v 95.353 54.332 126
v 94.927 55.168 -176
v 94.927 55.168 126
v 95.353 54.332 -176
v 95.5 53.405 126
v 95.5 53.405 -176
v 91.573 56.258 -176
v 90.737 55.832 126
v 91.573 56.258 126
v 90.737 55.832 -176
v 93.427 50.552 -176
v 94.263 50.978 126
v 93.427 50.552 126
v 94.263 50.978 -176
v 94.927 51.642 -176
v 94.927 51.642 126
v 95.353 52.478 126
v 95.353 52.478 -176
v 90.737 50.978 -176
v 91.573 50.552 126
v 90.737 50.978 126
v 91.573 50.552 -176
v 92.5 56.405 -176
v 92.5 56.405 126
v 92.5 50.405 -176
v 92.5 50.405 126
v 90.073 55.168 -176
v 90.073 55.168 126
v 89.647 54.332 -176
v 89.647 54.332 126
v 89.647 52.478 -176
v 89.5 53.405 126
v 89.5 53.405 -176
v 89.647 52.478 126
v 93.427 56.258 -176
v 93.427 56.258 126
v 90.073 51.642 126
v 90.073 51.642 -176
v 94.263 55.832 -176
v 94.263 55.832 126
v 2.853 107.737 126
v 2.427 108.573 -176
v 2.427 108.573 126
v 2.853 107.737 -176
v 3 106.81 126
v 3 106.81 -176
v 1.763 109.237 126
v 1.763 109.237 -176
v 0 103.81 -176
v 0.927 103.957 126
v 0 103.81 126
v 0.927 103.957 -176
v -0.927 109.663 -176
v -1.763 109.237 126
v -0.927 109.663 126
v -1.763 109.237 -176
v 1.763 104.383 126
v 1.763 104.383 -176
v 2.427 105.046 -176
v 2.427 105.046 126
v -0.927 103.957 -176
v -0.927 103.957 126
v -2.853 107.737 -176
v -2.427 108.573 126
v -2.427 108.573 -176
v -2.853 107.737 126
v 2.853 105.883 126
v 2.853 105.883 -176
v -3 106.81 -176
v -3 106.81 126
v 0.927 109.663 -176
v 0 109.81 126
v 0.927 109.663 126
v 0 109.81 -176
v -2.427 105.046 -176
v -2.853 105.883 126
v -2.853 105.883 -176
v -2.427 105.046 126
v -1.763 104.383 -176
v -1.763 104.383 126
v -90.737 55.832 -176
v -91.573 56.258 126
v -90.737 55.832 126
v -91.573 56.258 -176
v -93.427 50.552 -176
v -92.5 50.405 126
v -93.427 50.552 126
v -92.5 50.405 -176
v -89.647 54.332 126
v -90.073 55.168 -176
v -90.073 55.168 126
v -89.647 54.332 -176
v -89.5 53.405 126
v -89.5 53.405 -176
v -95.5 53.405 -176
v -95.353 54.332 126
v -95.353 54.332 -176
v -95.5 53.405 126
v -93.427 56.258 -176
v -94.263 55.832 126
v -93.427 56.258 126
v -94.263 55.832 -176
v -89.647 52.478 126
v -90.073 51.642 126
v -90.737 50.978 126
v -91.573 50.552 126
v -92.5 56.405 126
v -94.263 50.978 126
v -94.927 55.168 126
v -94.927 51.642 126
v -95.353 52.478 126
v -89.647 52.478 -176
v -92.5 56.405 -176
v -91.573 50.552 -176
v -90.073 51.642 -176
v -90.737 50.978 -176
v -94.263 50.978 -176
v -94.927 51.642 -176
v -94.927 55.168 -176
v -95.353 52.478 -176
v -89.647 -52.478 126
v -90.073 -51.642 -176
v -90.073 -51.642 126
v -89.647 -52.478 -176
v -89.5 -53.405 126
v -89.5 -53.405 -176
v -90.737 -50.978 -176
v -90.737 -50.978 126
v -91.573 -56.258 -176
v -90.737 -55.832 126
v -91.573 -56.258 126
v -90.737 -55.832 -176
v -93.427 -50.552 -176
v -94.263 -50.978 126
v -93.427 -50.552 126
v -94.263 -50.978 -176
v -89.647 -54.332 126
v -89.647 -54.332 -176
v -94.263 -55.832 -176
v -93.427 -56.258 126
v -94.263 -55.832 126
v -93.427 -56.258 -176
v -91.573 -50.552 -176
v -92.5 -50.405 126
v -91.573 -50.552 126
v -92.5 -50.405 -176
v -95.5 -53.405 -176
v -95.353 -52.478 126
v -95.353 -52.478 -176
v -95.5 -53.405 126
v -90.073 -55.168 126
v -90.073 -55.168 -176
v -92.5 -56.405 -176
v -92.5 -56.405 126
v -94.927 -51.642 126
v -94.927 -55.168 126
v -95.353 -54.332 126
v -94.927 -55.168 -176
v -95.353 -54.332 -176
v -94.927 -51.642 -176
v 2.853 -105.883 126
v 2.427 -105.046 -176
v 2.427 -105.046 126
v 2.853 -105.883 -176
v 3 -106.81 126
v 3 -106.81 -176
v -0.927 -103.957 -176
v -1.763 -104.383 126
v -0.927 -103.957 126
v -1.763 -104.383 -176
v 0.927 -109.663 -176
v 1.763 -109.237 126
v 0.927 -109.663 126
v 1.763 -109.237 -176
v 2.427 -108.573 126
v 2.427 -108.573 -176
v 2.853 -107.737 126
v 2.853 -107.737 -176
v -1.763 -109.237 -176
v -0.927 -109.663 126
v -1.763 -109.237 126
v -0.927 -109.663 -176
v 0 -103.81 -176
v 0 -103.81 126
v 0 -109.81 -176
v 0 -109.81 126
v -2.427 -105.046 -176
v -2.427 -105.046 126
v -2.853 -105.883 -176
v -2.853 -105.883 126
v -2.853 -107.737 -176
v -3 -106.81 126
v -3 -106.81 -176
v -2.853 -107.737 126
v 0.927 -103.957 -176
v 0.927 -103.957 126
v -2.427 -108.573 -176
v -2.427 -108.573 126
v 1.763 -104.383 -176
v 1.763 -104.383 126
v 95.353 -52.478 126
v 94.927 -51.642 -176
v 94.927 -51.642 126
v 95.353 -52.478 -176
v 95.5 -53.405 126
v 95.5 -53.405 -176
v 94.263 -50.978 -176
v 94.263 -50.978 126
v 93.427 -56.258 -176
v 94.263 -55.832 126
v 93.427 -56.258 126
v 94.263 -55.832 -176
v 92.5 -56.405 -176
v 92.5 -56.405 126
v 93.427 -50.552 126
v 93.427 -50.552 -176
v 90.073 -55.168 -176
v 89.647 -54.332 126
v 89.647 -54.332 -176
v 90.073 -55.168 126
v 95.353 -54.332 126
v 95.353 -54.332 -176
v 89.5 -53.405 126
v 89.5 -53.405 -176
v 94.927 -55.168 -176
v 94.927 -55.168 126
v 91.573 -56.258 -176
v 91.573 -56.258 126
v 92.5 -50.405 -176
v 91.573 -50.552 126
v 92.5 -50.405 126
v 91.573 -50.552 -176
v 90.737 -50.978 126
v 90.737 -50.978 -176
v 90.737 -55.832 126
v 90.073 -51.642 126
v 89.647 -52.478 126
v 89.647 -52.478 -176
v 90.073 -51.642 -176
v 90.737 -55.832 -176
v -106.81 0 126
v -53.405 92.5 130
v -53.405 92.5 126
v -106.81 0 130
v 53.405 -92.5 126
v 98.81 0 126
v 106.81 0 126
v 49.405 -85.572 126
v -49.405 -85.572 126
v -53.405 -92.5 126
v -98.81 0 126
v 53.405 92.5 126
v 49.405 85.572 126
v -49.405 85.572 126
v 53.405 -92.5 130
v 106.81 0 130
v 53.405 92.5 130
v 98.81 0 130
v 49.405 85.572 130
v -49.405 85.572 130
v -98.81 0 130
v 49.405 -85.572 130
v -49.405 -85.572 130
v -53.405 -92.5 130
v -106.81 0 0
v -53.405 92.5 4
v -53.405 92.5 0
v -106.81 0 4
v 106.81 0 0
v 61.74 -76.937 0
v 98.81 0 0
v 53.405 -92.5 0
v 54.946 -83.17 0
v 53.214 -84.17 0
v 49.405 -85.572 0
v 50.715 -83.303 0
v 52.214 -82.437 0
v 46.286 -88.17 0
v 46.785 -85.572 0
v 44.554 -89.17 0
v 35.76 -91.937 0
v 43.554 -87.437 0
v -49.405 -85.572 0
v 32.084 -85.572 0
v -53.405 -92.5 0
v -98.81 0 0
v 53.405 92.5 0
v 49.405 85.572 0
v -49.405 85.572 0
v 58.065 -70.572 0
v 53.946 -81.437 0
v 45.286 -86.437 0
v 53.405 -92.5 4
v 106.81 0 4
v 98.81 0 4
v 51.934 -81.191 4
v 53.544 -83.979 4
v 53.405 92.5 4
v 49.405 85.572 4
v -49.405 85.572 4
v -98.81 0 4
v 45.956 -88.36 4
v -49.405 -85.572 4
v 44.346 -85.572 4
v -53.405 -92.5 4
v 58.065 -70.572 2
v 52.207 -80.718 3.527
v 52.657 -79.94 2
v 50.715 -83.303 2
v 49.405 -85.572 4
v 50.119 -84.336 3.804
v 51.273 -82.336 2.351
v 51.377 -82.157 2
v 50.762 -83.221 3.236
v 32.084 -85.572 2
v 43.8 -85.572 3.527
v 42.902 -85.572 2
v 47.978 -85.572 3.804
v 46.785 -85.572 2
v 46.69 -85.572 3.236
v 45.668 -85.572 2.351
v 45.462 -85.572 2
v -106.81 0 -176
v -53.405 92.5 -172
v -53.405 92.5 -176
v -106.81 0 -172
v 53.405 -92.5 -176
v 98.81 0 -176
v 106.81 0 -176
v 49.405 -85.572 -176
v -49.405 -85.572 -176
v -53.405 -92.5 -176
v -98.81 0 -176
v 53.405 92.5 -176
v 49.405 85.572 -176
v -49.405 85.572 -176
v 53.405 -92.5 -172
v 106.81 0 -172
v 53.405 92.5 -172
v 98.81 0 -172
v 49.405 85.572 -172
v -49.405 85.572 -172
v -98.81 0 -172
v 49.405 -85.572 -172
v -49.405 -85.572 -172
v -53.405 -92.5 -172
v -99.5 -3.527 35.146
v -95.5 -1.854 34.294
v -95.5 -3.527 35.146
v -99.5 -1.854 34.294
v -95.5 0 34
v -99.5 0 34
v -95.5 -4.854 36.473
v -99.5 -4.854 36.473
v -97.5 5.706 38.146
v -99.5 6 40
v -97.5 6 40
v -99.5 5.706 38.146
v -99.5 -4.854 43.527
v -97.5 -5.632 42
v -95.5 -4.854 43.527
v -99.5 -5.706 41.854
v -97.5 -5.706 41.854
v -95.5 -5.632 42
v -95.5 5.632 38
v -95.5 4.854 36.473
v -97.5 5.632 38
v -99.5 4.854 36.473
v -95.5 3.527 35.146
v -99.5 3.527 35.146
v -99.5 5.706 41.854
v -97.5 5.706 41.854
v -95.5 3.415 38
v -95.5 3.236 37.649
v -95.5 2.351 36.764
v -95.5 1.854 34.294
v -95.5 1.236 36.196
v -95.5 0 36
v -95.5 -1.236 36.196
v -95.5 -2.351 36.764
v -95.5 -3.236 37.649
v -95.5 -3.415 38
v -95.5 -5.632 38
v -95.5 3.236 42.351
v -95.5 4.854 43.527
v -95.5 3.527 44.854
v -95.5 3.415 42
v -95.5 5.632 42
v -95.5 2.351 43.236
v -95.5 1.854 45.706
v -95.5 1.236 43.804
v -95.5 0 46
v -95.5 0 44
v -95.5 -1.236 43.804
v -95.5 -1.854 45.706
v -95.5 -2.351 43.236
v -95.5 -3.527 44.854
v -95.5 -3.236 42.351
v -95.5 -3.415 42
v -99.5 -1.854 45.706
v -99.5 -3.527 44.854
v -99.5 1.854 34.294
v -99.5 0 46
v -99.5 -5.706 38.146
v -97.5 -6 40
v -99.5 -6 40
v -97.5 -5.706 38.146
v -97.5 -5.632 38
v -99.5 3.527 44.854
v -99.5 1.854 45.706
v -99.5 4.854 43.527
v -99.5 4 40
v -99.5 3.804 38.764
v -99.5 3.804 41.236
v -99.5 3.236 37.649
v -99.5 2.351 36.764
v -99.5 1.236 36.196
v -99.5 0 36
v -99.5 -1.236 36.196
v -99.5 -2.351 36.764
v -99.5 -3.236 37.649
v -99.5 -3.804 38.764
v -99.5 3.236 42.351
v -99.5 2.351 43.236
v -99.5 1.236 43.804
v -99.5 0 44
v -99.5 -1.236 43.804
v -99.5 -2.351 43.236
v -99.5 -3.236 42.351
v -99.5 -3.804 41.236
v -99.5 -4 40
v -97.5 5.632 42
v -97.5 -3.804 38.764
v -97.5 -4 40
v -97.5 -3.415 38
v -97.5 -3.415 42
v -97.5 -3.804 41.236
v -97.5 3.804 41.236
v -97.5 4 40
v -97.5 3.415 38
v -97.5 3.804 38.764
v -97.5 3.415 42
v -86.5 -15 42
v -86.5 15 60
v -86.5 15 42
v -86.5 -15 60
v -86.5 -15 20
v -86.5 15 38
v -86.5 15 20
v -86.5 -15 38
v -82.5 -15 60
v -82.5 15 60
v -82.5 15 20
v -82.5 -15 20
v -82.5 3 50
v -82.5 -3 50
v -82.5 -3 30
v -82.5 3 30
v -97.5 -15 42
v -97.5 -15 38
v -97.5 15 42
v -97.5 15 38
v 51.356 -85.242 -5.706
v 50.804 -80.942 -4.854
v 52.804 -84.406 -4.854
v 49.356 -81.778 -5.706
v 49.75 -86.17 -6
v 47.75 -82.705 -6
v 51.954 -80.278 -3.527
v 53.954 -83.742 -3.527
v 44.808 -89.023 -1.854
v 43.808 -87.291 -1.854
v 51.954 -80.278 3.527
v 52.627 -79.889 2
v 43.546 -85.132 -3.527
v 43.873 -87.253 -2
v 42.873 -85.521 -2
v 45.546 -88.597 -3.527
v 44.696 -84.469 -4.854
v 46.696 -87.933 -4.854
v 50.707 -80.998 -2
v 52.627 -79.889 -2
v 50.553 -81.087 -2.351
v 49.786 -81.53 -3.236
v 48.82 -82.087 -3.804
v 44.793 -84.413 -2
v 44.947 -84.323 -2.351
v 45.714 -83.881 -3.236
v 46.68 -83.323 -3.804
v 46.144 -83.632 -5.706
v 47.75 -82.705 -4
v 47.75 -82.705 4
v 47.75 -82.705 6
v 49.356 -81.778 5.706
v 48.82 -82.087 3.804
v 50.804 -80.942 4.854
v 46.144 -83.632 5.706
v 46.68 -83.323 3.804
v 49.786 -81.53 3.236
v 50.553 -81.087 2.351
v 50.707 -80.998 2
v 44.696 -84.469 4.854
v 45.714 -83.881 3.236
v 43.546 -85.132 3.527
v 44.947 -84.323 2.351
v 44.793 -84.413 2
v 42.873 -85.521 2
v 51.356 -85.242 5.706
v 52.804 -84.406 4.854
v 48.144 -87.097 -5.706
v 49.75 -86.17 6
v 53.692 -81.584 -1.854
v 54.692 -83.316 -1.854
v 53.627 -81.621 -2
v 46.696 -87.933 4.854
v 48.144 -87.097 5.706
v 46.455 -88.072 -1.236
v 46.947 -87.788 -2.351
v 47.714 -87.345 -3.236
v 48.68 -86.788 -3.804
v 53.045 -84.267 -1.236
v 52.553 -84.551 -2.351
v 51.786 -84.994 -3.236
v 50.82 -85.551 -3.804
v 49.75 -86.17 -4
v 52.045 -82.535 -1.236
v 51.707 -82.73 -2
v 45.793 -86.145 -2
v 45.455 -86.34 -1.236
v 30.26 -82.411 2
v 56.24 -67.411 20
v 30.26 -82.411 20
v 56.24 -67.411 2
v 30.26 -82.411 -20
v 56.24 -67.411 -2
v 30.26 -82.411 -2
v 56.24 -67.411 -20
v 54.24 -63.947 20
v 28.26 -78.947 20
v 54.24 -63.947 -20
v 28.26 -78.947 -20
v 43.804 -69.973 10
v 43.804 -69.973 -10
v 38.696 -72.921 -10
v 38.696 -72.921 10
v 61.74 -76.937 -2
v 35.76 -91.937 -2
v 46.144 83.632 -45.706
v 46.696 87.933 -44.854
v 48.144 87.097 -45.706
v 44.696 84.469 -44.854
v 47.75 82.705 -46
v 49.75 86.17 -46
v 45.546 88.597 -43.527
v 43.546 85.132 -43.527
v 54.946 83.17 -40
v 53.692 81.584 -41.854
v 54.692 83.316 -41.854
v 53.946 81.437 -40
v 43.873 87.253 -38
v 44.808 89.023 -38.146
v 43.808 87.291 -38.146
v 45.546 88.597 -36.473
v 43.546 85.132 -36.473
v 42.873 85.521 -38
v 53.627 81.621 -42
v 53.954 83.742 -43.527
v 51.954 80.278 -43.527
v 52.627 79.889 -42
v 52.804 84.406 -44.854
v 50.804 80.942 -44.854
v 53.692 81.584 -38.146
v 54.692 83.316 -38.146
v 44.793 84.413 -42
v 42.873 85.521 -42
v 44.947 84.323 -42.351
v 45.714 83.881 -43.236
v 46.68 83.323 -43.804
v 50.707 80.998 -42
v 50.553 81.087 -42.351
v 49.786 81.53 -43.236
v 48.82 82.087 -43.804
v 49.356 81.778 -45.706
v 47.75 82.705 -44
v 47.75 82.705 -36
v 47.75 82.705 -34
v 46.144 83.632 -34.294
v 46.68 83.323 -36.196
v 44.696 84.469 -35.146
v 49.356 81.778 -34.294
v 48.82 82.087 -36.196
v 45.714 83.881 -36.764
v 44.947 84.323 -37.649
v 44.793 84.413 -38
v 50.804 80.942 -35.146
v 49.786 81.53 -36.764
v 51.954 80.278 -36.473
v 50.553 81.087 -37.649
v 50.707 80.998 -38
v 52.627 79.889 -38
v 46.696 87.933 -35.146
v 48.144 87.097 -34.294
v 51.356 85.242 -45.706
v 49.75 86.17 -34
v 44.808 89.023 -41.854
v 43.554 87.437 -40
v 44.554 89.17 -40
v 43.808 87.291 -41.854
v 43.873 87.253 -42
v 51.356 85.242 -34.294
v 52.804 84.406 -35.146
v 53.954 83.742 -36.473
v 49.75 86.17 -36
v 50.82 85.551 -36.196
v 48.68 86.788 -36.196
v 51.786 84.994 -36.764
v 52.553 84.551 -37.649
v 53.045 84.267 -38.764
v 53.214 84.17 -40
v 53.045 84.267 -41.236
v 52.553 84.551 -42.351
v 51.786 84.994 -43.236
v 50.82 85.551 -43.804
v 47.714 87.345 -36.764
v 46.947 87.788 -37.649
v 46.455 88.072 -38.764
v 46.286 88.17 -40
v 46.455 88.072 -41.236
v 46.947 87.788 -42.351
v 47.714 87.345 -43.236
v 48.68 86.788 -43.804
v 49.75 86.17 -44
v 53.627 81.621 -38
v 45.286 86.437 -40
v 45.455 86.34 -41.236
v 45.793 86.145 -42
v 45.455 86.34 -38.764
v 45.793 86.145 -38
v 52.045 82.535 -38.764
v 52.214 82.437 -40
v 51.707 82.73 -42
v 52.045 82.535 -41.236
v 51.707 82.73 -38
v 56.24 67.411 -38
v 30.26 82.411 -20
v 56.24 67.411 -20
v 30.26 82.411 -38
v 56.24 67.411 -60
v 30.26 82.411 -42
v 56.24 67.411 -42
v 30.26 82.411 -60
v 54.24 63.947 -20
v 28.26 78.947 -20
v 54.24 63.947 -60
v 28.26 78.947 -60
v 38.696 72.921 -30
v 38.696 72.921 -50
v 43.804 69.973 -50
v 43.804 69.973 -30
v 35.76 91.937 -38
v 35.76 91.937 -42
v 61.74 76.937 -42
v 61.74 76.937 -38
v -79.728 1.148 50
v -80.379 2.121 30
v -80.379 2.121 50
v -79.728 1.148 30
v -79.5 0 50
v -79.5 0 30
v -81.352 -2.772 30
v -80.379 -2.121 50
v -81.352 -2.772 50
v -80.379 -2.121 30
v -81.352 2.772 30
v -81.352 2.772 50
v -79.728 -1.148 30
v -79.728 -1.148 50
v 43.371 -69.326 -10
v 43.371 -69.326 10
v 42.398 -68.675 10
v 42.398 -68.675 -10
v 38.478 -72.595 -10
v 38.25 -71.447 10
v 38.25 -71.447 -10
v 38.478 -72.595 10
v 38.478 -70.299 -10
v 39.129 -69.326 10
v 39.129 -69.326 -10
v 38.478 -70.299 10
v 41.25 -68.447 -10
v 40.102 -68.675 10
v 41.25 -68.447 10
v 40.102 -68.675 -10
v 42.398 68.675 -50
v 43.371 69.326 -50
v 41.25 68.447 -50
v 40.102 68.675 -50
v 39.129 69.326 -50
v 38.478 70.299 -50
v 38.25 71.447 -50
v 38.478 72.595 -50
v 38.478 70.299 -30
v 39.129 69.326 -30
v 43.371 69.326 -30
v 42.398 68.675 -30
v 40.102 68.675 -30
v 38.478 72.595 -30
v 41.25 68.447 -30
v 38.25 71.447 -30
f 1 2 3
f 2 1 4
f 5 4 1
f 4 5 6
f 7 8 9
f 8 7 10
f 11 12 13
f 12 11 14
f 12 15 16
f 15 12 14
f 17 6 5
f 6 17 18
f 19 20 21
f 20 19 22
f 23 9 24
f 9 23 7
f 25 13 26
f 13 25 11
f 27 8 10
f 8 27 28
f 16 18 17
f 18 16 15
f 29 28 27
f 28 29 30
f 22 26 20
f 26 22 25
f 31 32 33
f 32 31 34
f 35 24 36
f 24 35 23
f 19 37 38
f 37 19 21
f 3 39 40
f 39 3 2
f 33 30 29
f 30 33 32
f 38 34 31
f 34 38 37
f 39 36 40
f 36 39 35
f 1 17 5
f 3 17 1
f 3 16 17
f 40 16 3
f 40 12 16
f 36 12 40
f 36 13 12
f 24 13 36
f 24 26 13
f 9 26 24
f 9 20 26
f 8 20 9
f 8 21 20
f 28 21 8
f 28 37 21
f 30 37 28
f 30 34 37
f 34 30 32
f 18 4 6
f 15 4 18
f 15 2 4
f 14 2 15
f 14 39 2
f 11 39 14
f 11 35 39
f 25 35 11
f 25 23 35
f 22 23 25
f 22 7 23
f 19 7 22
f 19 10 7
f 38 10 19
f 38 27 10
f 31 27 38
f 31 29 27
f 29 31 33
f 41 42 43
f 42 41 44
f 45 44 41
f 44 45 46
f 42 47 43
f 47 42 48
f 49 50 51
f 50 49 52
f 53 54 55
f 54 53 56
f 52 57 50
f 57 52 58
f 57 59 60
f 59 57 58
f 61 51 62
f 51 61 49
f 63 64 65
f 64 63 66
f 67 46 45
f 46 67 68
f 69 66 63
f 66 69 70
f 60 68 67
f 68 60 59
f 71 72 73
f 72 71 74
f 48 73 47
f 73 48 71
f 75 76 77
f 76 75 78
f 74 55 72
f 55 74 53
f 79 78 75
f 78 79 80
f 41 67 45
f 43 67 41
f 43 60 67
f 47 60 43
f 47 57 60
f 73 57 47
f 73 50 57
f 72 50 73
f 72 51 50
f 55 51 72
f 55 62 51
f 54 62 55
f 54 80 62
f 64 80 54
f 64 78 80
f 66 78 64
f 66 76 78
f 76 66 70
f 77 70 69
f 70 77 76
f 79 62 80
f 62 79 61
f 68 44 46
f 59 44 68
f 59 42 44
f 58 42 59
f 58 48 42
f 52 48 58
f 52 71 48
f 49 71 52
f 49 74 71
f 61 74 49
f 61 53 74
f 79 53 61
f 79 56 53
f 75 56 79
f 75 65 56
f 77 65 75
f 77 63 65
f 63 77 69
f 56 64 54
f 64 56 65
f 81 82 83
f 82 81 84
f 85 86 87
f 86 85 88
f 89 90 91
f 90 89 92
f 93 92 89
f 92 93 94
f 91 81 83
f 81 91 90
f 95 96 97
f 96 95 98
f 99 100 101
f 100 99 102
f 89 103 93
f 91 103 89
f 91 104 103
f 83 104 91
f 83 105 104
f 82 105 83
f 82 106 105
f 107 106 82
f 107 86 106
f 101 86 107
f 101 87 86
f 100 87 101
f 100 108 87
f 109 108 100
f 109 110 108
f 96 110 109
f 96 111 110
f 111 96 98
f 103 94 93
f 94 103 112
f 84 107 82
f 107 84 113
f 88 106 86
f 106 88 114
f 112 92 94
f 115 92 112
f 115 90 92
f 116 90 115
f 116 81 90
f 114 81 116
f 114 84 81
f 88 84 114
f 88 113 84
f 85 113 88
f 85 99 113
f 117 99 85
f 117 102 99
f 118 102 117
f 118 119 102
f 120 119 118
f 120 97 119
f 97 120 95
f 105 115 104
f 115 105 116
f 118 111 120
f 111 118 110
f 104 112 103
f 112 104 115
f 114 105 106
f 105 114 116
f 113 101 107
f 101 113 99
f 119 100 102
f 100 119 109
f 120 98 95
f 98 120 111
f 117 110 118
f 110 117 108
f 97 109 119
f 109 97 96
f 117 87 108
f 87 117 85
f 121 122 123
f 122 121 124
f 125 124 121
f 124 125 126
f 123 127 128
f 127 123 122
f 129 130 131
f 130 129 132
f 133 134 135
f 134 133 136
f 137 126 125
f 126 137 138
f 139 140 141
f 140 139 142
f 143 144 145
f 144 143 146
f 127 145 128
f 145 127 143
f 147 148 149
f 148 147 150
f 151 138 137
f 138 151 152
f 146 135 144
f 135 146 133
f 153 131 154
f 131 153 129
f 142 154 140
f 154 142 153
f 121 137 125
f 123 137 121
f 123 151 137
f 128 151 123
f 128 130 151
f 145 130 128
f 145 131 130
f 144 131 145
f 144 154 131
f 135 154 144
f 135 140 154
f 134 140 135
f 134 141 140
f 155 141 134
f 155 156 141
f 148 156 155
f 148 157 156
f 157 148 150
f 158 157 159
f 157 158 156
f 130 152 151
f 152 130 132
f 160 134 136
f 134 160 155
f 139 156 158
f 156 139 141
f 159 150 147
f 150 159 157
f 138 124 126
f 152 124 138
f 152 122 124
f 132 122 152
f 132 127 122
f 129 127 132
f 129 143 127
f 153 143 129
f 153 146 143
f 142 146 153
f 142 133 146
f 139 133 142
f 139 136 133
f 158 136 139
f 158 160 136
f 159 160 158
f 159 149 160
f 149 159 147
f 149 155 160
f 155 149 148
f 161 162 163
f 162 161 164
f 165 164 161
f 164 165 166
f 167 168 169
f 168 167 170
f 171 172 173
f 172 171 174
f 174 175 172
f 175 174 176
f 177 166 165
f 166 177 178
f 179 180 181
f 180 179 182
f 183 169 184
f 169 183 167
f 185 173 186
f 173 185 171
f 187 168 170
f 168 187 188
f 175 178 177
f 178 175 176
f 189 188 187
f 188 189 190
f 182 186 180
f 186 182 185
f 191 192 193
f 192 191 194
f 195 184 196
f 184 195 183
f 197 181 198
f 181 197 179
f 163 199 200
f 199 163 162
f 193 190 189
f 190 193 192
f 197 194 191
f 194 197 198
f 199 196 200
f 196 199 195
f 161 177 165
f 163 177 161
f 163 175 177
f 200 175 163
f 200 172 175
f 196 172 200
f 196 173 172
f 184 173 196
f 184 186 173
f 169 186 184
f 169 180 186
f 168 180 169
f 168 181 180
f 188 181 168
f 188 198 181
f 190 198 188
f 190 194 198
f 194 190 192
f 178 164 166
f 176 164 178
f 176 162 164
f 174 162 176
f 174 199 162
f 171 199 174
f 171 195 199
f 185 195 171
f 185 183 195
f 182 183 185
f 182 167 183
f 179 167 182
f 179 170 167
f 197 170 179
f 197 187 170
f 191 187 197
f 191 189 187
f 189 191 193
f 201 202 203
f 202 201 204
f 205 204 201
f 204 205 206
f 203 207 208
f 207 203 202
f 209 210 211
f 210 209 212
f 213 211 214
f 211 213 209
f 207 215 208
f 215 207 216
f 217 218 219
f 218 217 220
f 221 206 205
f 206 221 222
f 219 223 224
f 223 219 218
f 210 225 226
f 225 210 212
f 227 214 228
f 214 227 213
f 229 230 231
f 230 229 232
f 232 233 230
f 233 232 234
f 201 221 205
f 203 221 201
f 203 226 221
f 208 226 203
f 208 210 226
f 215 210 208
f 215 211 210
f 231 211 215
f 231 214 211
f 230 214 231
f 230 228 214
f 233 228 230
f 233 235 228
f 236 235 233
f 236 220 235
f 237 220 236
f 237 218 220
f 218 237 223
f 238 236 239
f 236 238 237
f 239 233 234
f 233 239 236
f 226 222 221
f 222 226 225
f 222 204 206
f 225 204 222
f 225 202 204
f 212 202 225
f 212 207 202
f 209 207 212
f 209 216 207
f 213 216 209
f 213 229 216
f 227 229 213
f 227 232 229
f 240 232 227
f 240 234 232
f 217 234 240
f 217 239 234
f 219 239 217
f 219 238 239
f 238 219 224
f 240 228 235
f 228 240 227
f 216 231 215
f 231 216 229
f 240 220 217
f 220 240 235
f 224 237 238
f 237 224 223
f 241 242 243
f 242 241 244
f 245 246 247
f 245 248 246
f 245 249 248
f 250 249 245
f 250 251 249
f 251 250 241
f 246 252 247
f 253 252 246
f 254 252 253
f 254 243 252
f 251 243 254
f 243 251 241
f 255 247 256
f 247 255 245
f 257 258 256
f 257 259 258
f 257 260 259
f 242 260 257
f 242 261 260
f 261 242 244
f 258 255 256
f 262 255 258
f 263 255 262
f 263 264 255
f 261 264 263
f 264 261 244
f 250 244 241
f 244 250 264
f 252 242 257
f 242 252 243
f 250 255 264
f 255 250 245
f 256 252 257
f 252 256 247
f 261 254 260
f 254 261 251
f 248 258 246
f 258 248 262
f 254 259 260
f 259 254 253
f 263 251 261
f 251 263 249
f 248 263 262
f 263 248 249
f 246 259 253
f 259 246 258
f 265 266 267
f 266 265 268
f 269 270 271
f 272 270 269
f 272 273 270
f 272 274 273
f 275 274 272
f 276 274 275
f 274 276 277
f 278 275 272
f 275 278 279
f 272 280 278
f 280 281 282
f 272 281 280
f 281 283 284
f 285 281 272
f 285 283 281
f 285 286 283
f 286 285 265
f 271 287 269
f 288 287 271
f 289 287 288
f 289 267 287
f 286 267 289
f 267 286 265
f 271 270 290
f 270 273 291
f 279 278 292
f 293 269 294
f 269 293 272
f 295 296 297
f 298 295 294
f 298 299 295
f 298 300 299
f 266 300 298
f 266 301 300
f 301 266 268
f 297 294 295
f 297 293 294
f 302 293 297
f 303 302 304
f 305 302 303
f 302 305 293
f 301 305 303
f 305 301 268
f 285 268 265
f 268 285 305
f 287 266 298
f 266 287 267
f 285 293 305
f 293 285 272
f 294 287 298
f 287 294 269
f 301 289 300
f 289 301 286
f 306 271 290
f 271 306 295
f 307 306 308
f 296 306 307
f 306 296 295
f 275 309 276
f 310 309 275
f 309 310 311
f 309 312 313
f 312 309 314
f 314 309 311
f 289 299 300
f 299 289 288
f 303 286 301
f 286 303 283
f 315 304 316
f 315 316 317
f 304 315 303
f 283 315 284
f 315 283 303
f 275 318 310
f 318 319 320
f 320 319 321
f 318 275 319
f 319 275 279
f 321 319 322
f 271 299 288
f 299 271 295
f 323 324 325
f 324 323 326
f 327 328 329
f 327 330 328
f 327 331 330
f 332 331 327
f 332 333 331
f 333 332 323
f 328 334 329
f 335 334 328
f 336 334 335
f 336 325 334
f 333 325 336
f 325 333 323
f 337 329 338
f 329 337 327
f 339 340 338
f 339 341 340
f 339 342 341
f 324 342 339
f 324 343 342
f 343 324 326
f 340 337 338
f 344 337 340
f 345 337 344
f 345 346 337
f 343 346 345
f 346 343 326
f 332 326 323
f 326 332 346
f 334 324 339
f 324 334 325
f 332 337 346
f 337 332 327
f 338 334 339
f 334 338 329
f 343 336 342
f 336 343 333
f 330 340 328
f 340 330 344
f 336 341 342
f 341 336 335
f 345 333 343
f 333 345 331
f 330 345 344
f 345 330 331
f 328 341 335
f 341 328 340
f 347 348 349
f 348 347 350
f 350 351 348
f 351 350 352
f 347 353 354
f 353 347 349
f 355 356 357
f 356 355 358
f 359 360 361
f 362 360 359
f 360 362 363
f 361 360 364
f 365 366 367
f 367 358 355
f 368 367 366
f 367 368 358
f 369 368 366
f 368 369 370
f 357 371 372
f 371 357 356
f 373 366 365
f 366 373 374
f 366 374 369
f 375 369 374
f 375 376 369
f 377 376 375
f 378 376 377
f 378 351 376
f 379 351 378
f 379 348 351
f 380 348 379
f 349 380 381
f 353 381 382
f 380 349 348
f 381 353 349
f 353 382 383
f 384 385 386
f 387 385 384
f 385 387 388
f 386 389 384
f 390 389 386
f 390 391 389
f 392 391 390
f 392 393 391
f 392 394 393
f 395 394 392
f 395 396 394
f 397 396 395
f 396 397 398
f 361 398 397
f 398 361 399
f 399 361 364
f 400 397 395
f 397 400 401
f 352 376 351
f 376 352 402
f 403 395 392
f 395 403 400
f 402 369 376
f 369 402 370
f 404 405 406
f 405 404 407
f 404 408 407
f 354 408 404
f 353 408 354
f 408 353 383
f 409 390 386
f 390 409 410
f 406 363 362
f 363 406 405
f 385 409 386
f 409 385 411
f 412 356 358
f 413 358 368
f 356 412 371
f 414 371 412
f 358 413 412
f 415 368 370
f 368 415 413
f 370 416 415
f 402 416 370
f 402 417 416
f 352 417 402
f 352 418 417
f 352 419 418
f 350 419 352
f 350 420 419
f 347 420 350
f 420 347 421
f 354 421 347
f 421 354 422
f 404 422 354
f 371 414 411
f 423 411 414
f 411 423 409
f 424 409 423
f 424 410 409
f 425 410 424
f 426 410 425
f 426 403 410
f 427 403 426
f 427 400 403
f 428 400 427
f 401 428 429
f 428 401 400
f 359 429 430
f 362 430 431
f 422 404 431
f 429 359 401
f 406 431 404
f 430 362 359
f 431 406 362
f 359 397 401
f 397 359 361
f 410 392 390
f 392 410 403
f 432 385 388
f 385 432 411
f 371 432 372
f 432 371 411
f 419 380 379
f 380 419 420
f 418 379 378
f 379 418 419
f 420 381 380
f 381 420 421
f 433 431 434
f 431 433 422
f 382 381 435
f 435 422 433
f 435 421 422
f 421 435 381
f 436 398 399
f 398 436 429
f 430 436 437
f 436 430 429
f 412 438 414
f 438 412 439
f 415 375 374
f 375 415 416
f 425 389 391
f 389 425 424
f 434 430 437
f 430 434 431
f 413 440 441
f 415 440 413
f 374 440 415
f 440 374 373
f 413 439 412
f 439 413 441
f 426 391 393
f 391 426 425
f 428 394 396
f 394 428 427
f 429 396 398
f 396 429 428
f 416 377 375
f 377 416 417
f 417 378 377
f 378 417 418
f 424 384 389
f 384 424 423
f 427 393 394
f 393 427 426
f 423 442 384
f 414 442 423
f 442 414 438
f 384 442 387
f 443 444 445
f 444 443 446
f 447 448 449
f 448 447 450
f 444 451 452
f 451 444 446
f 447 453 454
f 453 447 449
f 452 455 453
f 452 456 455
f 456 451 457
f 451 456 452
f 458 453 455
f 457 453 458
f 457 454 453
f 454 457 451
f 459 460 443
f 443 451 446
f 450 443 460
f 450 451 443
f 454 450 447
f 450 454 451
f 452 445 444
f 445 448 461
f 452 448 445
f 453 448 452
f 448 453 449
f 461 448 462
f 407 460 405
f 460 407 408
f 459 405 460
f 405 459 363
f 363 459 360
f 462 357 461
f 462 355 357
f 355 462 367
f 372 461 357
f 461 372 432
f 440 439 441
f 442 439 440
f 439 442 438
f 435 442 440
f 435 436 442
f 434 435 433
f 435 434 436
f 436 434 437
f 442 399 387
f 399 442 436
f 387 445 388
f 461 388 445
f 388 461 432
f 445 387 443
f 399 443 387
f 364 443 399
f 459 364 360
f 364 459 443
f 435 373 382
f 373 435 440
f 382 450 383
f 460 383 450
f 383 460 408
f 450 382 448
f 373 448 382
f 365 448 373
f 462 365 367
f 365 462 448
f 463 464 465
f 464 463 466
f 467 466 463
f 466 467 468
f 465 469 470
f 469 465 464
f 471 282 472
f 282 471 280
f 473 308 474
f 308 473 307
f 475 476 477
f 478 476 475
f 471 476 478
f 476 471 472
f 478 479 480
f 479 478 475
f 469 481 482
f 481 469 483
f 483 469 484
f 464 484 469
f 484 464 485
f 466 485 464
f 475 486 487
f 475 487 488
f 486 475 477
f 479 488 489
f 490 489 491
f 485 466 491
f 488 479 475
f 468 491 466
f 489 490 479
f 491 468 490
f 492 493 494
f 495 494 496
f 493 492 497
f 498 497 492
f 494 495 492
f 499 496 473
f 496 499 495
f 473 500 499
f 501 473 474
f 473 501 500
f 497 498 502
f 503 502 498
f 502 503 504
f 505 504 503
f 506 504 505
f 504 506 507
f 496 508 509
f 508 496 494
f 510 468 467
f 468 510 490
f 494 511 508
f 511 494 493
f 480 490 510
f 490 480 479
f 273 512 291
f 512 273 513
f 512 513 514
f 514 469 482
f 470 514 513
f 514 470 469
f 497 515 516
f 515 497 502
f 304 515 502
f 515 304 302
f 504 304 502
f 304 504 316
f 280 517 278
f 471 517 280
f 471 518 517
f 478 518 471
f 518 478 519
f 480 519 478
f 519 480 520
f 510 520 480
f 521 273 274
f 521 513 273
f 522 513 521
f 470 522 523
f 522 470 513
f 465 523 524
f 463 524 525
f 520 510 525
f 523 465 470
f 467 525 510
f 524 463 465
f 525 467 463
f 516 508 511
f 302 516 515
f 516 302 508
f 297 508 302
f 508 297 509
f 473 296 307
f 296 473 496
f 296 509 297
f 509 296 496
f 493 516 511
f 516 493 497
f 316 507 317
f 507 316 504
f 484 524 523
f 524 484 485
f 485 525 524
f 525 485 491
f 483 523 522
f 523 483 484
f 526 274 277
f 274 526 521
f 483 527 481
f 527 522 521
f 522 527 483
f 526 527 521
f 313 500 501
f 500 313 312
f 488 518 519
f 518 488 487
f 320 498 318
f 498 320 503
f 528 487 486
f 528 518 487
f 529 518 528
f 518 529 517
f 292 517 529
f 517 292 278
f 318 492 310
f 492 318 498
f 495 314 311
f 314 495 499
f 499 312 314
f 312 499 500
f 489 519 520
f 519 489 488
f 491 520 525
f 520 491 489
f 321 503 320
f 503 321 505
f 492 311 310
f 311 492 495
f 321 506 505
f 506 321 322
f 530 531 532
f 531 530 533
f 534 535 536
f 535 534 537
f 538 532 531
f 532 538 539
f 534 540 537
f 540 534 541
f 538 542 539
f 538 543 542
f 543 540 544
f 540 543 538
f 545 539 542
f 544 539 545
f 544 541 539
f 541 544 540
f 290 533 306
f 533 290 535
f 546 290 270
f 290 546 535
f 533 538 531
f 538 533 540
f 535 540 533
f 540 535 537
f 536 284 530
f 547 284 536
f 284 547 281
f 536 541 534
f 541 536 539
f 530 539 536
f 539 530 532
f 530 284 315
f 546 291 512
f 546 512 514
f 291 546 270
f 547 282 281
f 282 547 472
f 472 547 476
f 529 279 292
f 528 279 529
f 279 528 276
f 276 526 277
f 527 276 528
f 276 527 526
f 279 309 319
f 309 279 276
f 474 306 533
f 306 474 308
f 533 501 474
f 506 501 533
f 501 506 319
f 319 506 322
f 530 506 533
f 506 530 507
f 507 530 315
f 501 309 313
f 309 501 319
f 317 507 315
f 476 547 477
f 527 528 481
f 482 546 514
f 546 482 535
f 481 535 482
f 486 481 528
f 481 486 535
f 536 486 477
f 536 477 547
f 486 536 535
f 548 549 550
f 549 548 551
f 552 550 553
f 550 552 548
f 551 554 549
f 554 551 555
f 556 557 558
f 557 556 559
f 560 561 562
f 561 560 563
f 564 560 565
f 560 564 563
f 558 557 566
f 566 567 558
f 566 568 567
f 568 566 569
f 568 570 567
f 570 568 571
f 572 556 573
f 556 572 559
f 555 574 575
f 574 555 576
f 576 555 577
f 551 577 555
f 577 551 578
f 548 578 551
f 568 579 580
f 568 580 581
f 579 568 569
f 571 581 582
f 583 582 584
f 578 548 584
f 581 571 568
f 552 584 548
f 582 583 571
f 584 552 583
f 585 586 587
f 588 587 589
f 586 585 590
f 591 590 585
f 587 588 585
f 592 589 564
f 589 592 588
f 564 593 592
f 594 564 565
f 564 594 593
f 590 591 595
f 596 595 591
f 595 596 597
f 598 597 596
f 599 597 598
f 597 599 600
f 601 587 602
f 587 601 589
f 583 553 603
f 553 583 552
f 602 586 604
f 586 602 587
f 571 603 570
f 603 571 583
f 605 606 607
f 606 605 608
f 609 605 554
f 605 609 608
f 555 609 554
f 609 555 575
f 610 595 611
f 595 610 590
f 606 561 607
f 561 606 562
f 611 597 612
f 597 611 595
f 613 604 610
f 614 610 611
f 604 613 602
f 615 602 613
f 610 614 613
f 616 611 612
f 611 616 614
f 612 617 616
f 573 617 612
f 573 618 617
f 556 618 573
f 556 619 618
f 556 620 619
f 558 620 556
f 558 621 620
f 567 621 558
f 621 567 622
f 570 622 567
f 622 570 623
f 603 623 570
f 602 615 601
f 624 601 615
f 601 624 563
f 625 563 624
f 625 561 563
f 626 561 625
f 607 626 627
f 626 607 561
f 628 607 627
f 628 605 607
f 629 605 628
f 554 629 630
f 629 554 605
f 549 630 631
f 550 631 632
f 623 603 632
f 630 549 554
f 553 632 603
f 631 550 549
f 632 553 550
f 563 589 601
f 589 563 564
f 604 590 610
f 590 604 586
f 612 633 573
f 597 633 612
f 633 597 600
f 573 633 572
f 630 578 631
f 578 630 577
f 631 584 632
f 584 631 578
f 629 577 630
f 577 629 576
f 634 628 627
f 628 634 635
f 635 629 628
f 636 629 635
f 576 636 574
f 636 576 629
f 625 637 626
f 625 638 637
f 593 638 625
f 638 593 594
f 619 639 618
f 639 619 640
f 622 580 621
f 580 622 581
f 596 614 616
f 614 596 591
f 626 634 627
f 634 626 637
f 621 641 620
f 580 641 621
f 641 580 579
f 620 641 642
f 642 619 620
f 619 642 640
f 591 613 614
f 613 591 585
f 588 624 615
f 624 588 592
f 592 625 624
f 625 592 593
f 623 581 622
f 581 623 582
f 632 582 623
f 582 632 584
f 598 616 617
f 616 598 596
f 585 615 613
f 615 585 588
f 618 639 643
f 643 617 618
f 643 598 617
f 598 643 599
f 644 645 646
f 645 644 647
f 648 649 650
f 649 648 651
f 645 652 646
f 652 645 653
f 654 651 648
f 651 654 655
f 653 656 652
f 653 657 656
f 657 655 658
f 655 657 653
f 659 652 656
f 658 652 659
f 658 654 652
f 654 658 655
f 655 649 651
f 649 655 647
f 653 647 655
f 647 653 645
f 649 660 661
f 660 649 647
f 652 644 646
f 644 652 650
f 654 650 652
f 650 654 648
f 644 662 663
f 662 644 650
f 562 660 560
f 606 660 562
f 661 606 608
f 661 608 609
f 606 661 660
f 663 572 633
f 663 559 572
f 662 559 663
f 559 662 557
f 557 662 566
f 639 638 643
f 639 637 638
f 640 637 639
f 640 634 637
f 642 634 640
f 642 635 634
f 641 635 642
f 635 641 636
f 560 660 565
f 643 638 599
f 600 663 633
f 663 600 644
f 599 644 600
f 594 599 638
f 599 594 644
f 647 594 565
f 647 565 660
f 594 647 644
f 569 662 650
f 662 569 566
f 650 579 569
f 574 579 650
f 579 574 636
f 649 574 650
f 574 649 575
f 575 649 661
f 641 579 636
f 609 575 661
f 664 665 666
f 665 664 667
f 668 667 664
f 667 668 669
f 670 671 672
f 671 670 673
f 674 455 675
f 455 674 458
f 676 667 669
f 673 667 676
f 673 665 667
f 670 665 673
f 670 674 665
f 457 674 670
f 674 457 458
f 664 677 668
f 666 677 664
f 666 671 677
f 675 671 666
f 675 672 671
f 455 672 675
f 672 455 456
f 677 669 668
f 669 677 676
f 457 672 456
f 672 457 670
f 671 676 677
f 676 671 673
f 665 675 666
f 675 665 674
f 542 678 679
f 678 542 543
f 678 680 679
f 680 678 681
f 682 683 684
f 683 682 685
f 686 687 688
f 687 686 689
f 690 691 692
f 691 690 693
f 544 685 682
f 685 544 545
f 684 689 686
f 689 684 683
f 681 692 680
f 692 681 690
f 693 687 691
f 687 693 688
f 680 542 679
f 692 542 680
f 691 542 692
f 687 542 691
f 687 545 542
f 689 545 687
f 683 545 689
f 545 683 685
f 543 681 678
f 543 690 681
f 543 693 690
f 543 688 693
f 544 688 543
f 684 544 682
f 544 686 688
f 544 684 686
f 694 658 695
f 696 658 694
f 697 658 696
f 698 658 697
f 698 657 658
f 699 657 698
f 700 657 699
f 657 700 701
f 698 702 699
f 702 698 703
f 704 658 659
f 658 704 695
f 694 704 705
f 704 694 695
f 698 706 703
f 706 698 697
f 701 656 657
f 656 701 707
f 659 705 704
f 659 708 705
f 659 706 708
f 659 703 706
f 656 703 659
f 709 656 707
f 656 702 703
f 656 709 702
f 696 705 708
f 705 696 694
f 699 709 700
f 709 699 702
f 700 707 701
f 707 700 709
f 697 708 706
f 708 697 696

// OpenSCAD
// =========================================================
// FRAME — Hexagonal Support Structure
// =========================================================
// Supports the entire triple helix assembly:
//   - Matrix stack (3 tiers)
//   - 3 helix camshafts at hex vertices
//   - Guide plates below matrix
//   - Anchor plate above matrix
//   - Drive system (motor/crank + belts)
//   - Dampeners between helices and matrix
//
// Hexagonal footprint, M6 threaded rod uprights at hex corners.
// =========================================================

include <config.scad>

/* [Visibility] */
SHOW_UPRIGHTS     = true;
SHOW_TOP_RING     = true;
SHOW_MID_RING     = true;
SHOW_BOT_RING     = true;
SHOW_HELIX_MOUNTS = true;
SHOW_DAMPENERS    = true;

// =========================================================
// STANDALONE RENDER
// =========================================================
frame_assembly();


// =========================================================
// FRAME ASSEMBLY
// =========================================================

module frame_assembly() {
    // Ring Z-positions
    top_z = TIER_PITCH + TIER_ENVELOPE_H/2 + 50;   // above Tier 1
    mid_z = 0;                                       // at Tier 2 center
    bot_z = -TIER_PITCH - TIER_ENVELOPE_H/2 - 100;  // below blocks

    // Hex corners for uprights
    for (i = [0 : 5]) {
        a = i * 60 + 30;  // hex corners at 30, 90, 150, 210, 270, 330
        px = FRAME_CORNER_R * cos(a);
        py = FRAME_CORNER_R * sin(a);

        // Vertical uprights
        if (SHOW_UPRIGHTS)
            color(C_FRAME)
            translate([px, py, bot_z])
                cylinder(d = FRAME_ROD_DIA, h = top_z - bot_z, $fn = 20);
    }

    // Horizontal rings (hex-shaped)
    if (SHOW_TOP_RING)
        translate([0, 0, top_z])
            hex_ring(FRAME_HEX_R, FRAME_WALL);

    if (SHOW_MID_RING)
        translate([0, 0, mid_z])
            hex_ring(FRAME_HEX_R, FRAME_WALL);

    if (SHOW_BOT_RING)
        translate([0, 0, bot_z])
            hex_ring(FRAME_HEX_R, FRAME_WALL);

    // Helix shaft mounts (L-brackets at 3 hex vertices)
    if (SHOW_HELIX_MOUNTS) {
        for (tier_idx = [0 : 2]) {
            vertex_angle = HELIX_VERTEX_ANGLES[tier_idx];
            tier_z = (1 - tier_idx) * TIER_PITCH;

            mount_r = FRAME_HEX_R + 5;
            mx = mount_r * cos(vertex_angle);
            my = mount_r * sin(vertex_angle);

            color([0.5, 0.5, 0.6])
            translate([mx, my, tier_z])
                rotate([0, 0, vertex_angle])
                    helix_shaft_mount();
        }
    }

    // Dampeners (between helix and matrix edge)
    if (SHOW_DAMPENERS) {
        for (tier_idx = [0 : 2]) {
            tier_angle = TIER_ANGLES[tier_idx];
            vertex_angle = HELIX_VERTEX_ANGLES[tier_idx];
            tier_z = (1 - tier_idx) * TIER_PITCH;

            // Dampener sits on the frame between helix and matrix
            damp_r = FRAME_HEX_R - 10;
            dx = damp_r * cos(vertex_angle);
            dy = damp_r * sin(vertex_angle);

            color([0.7, 0.7, 0.3, 0.8])
            translate([dx, dy, tier_z - DAMPENER_LENGTH/2])
                cylinder(d = DAMPENER_DIA, h = DAMPENER_LENGTH, $fn = 16);
        }
    }

    echo(str("=== FRAME ==="));
    echo(str("Hex diameter (F-F): ", FRAME_DIAMETER, "mm"));
    echo(str("Corner-to-corner: ", FRAME_CORNER_R * 2, "mm"));
    echo(str("Height: ", top_z - bot_z, "mm"));
}


// =========================================================
// HEX RING (horizontal support ring)
// =========================================================

module hex_ring(hex_r, thick) {
    color(C_FRAME)
    difference() {
        // Outer hex
        linear_extrude(height = thick)
            circle(r = hex_r / cos(30), $fn = 6);

        // Inner hex (hollow)
        translate([0, 0, -1])
            linear_extrude(height = thick + 2)
                circle(r = hex_r / cos(30) - FRAME_WALL * 2, $fn = 6);
    }
}


// =========================================================
// HELIX SHAFT MOUNT (L-bracket)
// =========================================================

module helix_shaft_mount() {
    bracket_w = 30;
    bracket_h = 40;
    bracket_d = 15;
    plate_t = 4;

    // Vertical plate (attaches to frame upright)
    translate([-bracket_d, -bracket_w/2, -bracket_h/2])
        cube([plate_t, bracket_w, bracket_h]);

    // Horizontal plate (shaft bearing sits here)
    translate([-bracket_d, -bracket_w/2, -plate_t/2])
        cube([bracket_d, bracket_w, plate_t]);

    // Shaft bearing hole
    color(C_STEEL)
    translate([0, 0, 0])
        rotate([0, 90, 0])
            difference() {
                cylinder(d = 12, h = plate_t, center = true, $fn = 20);
                cylinder(d = 8, h = plate_t + 2, center = true, $fn = 20);
            }
}
